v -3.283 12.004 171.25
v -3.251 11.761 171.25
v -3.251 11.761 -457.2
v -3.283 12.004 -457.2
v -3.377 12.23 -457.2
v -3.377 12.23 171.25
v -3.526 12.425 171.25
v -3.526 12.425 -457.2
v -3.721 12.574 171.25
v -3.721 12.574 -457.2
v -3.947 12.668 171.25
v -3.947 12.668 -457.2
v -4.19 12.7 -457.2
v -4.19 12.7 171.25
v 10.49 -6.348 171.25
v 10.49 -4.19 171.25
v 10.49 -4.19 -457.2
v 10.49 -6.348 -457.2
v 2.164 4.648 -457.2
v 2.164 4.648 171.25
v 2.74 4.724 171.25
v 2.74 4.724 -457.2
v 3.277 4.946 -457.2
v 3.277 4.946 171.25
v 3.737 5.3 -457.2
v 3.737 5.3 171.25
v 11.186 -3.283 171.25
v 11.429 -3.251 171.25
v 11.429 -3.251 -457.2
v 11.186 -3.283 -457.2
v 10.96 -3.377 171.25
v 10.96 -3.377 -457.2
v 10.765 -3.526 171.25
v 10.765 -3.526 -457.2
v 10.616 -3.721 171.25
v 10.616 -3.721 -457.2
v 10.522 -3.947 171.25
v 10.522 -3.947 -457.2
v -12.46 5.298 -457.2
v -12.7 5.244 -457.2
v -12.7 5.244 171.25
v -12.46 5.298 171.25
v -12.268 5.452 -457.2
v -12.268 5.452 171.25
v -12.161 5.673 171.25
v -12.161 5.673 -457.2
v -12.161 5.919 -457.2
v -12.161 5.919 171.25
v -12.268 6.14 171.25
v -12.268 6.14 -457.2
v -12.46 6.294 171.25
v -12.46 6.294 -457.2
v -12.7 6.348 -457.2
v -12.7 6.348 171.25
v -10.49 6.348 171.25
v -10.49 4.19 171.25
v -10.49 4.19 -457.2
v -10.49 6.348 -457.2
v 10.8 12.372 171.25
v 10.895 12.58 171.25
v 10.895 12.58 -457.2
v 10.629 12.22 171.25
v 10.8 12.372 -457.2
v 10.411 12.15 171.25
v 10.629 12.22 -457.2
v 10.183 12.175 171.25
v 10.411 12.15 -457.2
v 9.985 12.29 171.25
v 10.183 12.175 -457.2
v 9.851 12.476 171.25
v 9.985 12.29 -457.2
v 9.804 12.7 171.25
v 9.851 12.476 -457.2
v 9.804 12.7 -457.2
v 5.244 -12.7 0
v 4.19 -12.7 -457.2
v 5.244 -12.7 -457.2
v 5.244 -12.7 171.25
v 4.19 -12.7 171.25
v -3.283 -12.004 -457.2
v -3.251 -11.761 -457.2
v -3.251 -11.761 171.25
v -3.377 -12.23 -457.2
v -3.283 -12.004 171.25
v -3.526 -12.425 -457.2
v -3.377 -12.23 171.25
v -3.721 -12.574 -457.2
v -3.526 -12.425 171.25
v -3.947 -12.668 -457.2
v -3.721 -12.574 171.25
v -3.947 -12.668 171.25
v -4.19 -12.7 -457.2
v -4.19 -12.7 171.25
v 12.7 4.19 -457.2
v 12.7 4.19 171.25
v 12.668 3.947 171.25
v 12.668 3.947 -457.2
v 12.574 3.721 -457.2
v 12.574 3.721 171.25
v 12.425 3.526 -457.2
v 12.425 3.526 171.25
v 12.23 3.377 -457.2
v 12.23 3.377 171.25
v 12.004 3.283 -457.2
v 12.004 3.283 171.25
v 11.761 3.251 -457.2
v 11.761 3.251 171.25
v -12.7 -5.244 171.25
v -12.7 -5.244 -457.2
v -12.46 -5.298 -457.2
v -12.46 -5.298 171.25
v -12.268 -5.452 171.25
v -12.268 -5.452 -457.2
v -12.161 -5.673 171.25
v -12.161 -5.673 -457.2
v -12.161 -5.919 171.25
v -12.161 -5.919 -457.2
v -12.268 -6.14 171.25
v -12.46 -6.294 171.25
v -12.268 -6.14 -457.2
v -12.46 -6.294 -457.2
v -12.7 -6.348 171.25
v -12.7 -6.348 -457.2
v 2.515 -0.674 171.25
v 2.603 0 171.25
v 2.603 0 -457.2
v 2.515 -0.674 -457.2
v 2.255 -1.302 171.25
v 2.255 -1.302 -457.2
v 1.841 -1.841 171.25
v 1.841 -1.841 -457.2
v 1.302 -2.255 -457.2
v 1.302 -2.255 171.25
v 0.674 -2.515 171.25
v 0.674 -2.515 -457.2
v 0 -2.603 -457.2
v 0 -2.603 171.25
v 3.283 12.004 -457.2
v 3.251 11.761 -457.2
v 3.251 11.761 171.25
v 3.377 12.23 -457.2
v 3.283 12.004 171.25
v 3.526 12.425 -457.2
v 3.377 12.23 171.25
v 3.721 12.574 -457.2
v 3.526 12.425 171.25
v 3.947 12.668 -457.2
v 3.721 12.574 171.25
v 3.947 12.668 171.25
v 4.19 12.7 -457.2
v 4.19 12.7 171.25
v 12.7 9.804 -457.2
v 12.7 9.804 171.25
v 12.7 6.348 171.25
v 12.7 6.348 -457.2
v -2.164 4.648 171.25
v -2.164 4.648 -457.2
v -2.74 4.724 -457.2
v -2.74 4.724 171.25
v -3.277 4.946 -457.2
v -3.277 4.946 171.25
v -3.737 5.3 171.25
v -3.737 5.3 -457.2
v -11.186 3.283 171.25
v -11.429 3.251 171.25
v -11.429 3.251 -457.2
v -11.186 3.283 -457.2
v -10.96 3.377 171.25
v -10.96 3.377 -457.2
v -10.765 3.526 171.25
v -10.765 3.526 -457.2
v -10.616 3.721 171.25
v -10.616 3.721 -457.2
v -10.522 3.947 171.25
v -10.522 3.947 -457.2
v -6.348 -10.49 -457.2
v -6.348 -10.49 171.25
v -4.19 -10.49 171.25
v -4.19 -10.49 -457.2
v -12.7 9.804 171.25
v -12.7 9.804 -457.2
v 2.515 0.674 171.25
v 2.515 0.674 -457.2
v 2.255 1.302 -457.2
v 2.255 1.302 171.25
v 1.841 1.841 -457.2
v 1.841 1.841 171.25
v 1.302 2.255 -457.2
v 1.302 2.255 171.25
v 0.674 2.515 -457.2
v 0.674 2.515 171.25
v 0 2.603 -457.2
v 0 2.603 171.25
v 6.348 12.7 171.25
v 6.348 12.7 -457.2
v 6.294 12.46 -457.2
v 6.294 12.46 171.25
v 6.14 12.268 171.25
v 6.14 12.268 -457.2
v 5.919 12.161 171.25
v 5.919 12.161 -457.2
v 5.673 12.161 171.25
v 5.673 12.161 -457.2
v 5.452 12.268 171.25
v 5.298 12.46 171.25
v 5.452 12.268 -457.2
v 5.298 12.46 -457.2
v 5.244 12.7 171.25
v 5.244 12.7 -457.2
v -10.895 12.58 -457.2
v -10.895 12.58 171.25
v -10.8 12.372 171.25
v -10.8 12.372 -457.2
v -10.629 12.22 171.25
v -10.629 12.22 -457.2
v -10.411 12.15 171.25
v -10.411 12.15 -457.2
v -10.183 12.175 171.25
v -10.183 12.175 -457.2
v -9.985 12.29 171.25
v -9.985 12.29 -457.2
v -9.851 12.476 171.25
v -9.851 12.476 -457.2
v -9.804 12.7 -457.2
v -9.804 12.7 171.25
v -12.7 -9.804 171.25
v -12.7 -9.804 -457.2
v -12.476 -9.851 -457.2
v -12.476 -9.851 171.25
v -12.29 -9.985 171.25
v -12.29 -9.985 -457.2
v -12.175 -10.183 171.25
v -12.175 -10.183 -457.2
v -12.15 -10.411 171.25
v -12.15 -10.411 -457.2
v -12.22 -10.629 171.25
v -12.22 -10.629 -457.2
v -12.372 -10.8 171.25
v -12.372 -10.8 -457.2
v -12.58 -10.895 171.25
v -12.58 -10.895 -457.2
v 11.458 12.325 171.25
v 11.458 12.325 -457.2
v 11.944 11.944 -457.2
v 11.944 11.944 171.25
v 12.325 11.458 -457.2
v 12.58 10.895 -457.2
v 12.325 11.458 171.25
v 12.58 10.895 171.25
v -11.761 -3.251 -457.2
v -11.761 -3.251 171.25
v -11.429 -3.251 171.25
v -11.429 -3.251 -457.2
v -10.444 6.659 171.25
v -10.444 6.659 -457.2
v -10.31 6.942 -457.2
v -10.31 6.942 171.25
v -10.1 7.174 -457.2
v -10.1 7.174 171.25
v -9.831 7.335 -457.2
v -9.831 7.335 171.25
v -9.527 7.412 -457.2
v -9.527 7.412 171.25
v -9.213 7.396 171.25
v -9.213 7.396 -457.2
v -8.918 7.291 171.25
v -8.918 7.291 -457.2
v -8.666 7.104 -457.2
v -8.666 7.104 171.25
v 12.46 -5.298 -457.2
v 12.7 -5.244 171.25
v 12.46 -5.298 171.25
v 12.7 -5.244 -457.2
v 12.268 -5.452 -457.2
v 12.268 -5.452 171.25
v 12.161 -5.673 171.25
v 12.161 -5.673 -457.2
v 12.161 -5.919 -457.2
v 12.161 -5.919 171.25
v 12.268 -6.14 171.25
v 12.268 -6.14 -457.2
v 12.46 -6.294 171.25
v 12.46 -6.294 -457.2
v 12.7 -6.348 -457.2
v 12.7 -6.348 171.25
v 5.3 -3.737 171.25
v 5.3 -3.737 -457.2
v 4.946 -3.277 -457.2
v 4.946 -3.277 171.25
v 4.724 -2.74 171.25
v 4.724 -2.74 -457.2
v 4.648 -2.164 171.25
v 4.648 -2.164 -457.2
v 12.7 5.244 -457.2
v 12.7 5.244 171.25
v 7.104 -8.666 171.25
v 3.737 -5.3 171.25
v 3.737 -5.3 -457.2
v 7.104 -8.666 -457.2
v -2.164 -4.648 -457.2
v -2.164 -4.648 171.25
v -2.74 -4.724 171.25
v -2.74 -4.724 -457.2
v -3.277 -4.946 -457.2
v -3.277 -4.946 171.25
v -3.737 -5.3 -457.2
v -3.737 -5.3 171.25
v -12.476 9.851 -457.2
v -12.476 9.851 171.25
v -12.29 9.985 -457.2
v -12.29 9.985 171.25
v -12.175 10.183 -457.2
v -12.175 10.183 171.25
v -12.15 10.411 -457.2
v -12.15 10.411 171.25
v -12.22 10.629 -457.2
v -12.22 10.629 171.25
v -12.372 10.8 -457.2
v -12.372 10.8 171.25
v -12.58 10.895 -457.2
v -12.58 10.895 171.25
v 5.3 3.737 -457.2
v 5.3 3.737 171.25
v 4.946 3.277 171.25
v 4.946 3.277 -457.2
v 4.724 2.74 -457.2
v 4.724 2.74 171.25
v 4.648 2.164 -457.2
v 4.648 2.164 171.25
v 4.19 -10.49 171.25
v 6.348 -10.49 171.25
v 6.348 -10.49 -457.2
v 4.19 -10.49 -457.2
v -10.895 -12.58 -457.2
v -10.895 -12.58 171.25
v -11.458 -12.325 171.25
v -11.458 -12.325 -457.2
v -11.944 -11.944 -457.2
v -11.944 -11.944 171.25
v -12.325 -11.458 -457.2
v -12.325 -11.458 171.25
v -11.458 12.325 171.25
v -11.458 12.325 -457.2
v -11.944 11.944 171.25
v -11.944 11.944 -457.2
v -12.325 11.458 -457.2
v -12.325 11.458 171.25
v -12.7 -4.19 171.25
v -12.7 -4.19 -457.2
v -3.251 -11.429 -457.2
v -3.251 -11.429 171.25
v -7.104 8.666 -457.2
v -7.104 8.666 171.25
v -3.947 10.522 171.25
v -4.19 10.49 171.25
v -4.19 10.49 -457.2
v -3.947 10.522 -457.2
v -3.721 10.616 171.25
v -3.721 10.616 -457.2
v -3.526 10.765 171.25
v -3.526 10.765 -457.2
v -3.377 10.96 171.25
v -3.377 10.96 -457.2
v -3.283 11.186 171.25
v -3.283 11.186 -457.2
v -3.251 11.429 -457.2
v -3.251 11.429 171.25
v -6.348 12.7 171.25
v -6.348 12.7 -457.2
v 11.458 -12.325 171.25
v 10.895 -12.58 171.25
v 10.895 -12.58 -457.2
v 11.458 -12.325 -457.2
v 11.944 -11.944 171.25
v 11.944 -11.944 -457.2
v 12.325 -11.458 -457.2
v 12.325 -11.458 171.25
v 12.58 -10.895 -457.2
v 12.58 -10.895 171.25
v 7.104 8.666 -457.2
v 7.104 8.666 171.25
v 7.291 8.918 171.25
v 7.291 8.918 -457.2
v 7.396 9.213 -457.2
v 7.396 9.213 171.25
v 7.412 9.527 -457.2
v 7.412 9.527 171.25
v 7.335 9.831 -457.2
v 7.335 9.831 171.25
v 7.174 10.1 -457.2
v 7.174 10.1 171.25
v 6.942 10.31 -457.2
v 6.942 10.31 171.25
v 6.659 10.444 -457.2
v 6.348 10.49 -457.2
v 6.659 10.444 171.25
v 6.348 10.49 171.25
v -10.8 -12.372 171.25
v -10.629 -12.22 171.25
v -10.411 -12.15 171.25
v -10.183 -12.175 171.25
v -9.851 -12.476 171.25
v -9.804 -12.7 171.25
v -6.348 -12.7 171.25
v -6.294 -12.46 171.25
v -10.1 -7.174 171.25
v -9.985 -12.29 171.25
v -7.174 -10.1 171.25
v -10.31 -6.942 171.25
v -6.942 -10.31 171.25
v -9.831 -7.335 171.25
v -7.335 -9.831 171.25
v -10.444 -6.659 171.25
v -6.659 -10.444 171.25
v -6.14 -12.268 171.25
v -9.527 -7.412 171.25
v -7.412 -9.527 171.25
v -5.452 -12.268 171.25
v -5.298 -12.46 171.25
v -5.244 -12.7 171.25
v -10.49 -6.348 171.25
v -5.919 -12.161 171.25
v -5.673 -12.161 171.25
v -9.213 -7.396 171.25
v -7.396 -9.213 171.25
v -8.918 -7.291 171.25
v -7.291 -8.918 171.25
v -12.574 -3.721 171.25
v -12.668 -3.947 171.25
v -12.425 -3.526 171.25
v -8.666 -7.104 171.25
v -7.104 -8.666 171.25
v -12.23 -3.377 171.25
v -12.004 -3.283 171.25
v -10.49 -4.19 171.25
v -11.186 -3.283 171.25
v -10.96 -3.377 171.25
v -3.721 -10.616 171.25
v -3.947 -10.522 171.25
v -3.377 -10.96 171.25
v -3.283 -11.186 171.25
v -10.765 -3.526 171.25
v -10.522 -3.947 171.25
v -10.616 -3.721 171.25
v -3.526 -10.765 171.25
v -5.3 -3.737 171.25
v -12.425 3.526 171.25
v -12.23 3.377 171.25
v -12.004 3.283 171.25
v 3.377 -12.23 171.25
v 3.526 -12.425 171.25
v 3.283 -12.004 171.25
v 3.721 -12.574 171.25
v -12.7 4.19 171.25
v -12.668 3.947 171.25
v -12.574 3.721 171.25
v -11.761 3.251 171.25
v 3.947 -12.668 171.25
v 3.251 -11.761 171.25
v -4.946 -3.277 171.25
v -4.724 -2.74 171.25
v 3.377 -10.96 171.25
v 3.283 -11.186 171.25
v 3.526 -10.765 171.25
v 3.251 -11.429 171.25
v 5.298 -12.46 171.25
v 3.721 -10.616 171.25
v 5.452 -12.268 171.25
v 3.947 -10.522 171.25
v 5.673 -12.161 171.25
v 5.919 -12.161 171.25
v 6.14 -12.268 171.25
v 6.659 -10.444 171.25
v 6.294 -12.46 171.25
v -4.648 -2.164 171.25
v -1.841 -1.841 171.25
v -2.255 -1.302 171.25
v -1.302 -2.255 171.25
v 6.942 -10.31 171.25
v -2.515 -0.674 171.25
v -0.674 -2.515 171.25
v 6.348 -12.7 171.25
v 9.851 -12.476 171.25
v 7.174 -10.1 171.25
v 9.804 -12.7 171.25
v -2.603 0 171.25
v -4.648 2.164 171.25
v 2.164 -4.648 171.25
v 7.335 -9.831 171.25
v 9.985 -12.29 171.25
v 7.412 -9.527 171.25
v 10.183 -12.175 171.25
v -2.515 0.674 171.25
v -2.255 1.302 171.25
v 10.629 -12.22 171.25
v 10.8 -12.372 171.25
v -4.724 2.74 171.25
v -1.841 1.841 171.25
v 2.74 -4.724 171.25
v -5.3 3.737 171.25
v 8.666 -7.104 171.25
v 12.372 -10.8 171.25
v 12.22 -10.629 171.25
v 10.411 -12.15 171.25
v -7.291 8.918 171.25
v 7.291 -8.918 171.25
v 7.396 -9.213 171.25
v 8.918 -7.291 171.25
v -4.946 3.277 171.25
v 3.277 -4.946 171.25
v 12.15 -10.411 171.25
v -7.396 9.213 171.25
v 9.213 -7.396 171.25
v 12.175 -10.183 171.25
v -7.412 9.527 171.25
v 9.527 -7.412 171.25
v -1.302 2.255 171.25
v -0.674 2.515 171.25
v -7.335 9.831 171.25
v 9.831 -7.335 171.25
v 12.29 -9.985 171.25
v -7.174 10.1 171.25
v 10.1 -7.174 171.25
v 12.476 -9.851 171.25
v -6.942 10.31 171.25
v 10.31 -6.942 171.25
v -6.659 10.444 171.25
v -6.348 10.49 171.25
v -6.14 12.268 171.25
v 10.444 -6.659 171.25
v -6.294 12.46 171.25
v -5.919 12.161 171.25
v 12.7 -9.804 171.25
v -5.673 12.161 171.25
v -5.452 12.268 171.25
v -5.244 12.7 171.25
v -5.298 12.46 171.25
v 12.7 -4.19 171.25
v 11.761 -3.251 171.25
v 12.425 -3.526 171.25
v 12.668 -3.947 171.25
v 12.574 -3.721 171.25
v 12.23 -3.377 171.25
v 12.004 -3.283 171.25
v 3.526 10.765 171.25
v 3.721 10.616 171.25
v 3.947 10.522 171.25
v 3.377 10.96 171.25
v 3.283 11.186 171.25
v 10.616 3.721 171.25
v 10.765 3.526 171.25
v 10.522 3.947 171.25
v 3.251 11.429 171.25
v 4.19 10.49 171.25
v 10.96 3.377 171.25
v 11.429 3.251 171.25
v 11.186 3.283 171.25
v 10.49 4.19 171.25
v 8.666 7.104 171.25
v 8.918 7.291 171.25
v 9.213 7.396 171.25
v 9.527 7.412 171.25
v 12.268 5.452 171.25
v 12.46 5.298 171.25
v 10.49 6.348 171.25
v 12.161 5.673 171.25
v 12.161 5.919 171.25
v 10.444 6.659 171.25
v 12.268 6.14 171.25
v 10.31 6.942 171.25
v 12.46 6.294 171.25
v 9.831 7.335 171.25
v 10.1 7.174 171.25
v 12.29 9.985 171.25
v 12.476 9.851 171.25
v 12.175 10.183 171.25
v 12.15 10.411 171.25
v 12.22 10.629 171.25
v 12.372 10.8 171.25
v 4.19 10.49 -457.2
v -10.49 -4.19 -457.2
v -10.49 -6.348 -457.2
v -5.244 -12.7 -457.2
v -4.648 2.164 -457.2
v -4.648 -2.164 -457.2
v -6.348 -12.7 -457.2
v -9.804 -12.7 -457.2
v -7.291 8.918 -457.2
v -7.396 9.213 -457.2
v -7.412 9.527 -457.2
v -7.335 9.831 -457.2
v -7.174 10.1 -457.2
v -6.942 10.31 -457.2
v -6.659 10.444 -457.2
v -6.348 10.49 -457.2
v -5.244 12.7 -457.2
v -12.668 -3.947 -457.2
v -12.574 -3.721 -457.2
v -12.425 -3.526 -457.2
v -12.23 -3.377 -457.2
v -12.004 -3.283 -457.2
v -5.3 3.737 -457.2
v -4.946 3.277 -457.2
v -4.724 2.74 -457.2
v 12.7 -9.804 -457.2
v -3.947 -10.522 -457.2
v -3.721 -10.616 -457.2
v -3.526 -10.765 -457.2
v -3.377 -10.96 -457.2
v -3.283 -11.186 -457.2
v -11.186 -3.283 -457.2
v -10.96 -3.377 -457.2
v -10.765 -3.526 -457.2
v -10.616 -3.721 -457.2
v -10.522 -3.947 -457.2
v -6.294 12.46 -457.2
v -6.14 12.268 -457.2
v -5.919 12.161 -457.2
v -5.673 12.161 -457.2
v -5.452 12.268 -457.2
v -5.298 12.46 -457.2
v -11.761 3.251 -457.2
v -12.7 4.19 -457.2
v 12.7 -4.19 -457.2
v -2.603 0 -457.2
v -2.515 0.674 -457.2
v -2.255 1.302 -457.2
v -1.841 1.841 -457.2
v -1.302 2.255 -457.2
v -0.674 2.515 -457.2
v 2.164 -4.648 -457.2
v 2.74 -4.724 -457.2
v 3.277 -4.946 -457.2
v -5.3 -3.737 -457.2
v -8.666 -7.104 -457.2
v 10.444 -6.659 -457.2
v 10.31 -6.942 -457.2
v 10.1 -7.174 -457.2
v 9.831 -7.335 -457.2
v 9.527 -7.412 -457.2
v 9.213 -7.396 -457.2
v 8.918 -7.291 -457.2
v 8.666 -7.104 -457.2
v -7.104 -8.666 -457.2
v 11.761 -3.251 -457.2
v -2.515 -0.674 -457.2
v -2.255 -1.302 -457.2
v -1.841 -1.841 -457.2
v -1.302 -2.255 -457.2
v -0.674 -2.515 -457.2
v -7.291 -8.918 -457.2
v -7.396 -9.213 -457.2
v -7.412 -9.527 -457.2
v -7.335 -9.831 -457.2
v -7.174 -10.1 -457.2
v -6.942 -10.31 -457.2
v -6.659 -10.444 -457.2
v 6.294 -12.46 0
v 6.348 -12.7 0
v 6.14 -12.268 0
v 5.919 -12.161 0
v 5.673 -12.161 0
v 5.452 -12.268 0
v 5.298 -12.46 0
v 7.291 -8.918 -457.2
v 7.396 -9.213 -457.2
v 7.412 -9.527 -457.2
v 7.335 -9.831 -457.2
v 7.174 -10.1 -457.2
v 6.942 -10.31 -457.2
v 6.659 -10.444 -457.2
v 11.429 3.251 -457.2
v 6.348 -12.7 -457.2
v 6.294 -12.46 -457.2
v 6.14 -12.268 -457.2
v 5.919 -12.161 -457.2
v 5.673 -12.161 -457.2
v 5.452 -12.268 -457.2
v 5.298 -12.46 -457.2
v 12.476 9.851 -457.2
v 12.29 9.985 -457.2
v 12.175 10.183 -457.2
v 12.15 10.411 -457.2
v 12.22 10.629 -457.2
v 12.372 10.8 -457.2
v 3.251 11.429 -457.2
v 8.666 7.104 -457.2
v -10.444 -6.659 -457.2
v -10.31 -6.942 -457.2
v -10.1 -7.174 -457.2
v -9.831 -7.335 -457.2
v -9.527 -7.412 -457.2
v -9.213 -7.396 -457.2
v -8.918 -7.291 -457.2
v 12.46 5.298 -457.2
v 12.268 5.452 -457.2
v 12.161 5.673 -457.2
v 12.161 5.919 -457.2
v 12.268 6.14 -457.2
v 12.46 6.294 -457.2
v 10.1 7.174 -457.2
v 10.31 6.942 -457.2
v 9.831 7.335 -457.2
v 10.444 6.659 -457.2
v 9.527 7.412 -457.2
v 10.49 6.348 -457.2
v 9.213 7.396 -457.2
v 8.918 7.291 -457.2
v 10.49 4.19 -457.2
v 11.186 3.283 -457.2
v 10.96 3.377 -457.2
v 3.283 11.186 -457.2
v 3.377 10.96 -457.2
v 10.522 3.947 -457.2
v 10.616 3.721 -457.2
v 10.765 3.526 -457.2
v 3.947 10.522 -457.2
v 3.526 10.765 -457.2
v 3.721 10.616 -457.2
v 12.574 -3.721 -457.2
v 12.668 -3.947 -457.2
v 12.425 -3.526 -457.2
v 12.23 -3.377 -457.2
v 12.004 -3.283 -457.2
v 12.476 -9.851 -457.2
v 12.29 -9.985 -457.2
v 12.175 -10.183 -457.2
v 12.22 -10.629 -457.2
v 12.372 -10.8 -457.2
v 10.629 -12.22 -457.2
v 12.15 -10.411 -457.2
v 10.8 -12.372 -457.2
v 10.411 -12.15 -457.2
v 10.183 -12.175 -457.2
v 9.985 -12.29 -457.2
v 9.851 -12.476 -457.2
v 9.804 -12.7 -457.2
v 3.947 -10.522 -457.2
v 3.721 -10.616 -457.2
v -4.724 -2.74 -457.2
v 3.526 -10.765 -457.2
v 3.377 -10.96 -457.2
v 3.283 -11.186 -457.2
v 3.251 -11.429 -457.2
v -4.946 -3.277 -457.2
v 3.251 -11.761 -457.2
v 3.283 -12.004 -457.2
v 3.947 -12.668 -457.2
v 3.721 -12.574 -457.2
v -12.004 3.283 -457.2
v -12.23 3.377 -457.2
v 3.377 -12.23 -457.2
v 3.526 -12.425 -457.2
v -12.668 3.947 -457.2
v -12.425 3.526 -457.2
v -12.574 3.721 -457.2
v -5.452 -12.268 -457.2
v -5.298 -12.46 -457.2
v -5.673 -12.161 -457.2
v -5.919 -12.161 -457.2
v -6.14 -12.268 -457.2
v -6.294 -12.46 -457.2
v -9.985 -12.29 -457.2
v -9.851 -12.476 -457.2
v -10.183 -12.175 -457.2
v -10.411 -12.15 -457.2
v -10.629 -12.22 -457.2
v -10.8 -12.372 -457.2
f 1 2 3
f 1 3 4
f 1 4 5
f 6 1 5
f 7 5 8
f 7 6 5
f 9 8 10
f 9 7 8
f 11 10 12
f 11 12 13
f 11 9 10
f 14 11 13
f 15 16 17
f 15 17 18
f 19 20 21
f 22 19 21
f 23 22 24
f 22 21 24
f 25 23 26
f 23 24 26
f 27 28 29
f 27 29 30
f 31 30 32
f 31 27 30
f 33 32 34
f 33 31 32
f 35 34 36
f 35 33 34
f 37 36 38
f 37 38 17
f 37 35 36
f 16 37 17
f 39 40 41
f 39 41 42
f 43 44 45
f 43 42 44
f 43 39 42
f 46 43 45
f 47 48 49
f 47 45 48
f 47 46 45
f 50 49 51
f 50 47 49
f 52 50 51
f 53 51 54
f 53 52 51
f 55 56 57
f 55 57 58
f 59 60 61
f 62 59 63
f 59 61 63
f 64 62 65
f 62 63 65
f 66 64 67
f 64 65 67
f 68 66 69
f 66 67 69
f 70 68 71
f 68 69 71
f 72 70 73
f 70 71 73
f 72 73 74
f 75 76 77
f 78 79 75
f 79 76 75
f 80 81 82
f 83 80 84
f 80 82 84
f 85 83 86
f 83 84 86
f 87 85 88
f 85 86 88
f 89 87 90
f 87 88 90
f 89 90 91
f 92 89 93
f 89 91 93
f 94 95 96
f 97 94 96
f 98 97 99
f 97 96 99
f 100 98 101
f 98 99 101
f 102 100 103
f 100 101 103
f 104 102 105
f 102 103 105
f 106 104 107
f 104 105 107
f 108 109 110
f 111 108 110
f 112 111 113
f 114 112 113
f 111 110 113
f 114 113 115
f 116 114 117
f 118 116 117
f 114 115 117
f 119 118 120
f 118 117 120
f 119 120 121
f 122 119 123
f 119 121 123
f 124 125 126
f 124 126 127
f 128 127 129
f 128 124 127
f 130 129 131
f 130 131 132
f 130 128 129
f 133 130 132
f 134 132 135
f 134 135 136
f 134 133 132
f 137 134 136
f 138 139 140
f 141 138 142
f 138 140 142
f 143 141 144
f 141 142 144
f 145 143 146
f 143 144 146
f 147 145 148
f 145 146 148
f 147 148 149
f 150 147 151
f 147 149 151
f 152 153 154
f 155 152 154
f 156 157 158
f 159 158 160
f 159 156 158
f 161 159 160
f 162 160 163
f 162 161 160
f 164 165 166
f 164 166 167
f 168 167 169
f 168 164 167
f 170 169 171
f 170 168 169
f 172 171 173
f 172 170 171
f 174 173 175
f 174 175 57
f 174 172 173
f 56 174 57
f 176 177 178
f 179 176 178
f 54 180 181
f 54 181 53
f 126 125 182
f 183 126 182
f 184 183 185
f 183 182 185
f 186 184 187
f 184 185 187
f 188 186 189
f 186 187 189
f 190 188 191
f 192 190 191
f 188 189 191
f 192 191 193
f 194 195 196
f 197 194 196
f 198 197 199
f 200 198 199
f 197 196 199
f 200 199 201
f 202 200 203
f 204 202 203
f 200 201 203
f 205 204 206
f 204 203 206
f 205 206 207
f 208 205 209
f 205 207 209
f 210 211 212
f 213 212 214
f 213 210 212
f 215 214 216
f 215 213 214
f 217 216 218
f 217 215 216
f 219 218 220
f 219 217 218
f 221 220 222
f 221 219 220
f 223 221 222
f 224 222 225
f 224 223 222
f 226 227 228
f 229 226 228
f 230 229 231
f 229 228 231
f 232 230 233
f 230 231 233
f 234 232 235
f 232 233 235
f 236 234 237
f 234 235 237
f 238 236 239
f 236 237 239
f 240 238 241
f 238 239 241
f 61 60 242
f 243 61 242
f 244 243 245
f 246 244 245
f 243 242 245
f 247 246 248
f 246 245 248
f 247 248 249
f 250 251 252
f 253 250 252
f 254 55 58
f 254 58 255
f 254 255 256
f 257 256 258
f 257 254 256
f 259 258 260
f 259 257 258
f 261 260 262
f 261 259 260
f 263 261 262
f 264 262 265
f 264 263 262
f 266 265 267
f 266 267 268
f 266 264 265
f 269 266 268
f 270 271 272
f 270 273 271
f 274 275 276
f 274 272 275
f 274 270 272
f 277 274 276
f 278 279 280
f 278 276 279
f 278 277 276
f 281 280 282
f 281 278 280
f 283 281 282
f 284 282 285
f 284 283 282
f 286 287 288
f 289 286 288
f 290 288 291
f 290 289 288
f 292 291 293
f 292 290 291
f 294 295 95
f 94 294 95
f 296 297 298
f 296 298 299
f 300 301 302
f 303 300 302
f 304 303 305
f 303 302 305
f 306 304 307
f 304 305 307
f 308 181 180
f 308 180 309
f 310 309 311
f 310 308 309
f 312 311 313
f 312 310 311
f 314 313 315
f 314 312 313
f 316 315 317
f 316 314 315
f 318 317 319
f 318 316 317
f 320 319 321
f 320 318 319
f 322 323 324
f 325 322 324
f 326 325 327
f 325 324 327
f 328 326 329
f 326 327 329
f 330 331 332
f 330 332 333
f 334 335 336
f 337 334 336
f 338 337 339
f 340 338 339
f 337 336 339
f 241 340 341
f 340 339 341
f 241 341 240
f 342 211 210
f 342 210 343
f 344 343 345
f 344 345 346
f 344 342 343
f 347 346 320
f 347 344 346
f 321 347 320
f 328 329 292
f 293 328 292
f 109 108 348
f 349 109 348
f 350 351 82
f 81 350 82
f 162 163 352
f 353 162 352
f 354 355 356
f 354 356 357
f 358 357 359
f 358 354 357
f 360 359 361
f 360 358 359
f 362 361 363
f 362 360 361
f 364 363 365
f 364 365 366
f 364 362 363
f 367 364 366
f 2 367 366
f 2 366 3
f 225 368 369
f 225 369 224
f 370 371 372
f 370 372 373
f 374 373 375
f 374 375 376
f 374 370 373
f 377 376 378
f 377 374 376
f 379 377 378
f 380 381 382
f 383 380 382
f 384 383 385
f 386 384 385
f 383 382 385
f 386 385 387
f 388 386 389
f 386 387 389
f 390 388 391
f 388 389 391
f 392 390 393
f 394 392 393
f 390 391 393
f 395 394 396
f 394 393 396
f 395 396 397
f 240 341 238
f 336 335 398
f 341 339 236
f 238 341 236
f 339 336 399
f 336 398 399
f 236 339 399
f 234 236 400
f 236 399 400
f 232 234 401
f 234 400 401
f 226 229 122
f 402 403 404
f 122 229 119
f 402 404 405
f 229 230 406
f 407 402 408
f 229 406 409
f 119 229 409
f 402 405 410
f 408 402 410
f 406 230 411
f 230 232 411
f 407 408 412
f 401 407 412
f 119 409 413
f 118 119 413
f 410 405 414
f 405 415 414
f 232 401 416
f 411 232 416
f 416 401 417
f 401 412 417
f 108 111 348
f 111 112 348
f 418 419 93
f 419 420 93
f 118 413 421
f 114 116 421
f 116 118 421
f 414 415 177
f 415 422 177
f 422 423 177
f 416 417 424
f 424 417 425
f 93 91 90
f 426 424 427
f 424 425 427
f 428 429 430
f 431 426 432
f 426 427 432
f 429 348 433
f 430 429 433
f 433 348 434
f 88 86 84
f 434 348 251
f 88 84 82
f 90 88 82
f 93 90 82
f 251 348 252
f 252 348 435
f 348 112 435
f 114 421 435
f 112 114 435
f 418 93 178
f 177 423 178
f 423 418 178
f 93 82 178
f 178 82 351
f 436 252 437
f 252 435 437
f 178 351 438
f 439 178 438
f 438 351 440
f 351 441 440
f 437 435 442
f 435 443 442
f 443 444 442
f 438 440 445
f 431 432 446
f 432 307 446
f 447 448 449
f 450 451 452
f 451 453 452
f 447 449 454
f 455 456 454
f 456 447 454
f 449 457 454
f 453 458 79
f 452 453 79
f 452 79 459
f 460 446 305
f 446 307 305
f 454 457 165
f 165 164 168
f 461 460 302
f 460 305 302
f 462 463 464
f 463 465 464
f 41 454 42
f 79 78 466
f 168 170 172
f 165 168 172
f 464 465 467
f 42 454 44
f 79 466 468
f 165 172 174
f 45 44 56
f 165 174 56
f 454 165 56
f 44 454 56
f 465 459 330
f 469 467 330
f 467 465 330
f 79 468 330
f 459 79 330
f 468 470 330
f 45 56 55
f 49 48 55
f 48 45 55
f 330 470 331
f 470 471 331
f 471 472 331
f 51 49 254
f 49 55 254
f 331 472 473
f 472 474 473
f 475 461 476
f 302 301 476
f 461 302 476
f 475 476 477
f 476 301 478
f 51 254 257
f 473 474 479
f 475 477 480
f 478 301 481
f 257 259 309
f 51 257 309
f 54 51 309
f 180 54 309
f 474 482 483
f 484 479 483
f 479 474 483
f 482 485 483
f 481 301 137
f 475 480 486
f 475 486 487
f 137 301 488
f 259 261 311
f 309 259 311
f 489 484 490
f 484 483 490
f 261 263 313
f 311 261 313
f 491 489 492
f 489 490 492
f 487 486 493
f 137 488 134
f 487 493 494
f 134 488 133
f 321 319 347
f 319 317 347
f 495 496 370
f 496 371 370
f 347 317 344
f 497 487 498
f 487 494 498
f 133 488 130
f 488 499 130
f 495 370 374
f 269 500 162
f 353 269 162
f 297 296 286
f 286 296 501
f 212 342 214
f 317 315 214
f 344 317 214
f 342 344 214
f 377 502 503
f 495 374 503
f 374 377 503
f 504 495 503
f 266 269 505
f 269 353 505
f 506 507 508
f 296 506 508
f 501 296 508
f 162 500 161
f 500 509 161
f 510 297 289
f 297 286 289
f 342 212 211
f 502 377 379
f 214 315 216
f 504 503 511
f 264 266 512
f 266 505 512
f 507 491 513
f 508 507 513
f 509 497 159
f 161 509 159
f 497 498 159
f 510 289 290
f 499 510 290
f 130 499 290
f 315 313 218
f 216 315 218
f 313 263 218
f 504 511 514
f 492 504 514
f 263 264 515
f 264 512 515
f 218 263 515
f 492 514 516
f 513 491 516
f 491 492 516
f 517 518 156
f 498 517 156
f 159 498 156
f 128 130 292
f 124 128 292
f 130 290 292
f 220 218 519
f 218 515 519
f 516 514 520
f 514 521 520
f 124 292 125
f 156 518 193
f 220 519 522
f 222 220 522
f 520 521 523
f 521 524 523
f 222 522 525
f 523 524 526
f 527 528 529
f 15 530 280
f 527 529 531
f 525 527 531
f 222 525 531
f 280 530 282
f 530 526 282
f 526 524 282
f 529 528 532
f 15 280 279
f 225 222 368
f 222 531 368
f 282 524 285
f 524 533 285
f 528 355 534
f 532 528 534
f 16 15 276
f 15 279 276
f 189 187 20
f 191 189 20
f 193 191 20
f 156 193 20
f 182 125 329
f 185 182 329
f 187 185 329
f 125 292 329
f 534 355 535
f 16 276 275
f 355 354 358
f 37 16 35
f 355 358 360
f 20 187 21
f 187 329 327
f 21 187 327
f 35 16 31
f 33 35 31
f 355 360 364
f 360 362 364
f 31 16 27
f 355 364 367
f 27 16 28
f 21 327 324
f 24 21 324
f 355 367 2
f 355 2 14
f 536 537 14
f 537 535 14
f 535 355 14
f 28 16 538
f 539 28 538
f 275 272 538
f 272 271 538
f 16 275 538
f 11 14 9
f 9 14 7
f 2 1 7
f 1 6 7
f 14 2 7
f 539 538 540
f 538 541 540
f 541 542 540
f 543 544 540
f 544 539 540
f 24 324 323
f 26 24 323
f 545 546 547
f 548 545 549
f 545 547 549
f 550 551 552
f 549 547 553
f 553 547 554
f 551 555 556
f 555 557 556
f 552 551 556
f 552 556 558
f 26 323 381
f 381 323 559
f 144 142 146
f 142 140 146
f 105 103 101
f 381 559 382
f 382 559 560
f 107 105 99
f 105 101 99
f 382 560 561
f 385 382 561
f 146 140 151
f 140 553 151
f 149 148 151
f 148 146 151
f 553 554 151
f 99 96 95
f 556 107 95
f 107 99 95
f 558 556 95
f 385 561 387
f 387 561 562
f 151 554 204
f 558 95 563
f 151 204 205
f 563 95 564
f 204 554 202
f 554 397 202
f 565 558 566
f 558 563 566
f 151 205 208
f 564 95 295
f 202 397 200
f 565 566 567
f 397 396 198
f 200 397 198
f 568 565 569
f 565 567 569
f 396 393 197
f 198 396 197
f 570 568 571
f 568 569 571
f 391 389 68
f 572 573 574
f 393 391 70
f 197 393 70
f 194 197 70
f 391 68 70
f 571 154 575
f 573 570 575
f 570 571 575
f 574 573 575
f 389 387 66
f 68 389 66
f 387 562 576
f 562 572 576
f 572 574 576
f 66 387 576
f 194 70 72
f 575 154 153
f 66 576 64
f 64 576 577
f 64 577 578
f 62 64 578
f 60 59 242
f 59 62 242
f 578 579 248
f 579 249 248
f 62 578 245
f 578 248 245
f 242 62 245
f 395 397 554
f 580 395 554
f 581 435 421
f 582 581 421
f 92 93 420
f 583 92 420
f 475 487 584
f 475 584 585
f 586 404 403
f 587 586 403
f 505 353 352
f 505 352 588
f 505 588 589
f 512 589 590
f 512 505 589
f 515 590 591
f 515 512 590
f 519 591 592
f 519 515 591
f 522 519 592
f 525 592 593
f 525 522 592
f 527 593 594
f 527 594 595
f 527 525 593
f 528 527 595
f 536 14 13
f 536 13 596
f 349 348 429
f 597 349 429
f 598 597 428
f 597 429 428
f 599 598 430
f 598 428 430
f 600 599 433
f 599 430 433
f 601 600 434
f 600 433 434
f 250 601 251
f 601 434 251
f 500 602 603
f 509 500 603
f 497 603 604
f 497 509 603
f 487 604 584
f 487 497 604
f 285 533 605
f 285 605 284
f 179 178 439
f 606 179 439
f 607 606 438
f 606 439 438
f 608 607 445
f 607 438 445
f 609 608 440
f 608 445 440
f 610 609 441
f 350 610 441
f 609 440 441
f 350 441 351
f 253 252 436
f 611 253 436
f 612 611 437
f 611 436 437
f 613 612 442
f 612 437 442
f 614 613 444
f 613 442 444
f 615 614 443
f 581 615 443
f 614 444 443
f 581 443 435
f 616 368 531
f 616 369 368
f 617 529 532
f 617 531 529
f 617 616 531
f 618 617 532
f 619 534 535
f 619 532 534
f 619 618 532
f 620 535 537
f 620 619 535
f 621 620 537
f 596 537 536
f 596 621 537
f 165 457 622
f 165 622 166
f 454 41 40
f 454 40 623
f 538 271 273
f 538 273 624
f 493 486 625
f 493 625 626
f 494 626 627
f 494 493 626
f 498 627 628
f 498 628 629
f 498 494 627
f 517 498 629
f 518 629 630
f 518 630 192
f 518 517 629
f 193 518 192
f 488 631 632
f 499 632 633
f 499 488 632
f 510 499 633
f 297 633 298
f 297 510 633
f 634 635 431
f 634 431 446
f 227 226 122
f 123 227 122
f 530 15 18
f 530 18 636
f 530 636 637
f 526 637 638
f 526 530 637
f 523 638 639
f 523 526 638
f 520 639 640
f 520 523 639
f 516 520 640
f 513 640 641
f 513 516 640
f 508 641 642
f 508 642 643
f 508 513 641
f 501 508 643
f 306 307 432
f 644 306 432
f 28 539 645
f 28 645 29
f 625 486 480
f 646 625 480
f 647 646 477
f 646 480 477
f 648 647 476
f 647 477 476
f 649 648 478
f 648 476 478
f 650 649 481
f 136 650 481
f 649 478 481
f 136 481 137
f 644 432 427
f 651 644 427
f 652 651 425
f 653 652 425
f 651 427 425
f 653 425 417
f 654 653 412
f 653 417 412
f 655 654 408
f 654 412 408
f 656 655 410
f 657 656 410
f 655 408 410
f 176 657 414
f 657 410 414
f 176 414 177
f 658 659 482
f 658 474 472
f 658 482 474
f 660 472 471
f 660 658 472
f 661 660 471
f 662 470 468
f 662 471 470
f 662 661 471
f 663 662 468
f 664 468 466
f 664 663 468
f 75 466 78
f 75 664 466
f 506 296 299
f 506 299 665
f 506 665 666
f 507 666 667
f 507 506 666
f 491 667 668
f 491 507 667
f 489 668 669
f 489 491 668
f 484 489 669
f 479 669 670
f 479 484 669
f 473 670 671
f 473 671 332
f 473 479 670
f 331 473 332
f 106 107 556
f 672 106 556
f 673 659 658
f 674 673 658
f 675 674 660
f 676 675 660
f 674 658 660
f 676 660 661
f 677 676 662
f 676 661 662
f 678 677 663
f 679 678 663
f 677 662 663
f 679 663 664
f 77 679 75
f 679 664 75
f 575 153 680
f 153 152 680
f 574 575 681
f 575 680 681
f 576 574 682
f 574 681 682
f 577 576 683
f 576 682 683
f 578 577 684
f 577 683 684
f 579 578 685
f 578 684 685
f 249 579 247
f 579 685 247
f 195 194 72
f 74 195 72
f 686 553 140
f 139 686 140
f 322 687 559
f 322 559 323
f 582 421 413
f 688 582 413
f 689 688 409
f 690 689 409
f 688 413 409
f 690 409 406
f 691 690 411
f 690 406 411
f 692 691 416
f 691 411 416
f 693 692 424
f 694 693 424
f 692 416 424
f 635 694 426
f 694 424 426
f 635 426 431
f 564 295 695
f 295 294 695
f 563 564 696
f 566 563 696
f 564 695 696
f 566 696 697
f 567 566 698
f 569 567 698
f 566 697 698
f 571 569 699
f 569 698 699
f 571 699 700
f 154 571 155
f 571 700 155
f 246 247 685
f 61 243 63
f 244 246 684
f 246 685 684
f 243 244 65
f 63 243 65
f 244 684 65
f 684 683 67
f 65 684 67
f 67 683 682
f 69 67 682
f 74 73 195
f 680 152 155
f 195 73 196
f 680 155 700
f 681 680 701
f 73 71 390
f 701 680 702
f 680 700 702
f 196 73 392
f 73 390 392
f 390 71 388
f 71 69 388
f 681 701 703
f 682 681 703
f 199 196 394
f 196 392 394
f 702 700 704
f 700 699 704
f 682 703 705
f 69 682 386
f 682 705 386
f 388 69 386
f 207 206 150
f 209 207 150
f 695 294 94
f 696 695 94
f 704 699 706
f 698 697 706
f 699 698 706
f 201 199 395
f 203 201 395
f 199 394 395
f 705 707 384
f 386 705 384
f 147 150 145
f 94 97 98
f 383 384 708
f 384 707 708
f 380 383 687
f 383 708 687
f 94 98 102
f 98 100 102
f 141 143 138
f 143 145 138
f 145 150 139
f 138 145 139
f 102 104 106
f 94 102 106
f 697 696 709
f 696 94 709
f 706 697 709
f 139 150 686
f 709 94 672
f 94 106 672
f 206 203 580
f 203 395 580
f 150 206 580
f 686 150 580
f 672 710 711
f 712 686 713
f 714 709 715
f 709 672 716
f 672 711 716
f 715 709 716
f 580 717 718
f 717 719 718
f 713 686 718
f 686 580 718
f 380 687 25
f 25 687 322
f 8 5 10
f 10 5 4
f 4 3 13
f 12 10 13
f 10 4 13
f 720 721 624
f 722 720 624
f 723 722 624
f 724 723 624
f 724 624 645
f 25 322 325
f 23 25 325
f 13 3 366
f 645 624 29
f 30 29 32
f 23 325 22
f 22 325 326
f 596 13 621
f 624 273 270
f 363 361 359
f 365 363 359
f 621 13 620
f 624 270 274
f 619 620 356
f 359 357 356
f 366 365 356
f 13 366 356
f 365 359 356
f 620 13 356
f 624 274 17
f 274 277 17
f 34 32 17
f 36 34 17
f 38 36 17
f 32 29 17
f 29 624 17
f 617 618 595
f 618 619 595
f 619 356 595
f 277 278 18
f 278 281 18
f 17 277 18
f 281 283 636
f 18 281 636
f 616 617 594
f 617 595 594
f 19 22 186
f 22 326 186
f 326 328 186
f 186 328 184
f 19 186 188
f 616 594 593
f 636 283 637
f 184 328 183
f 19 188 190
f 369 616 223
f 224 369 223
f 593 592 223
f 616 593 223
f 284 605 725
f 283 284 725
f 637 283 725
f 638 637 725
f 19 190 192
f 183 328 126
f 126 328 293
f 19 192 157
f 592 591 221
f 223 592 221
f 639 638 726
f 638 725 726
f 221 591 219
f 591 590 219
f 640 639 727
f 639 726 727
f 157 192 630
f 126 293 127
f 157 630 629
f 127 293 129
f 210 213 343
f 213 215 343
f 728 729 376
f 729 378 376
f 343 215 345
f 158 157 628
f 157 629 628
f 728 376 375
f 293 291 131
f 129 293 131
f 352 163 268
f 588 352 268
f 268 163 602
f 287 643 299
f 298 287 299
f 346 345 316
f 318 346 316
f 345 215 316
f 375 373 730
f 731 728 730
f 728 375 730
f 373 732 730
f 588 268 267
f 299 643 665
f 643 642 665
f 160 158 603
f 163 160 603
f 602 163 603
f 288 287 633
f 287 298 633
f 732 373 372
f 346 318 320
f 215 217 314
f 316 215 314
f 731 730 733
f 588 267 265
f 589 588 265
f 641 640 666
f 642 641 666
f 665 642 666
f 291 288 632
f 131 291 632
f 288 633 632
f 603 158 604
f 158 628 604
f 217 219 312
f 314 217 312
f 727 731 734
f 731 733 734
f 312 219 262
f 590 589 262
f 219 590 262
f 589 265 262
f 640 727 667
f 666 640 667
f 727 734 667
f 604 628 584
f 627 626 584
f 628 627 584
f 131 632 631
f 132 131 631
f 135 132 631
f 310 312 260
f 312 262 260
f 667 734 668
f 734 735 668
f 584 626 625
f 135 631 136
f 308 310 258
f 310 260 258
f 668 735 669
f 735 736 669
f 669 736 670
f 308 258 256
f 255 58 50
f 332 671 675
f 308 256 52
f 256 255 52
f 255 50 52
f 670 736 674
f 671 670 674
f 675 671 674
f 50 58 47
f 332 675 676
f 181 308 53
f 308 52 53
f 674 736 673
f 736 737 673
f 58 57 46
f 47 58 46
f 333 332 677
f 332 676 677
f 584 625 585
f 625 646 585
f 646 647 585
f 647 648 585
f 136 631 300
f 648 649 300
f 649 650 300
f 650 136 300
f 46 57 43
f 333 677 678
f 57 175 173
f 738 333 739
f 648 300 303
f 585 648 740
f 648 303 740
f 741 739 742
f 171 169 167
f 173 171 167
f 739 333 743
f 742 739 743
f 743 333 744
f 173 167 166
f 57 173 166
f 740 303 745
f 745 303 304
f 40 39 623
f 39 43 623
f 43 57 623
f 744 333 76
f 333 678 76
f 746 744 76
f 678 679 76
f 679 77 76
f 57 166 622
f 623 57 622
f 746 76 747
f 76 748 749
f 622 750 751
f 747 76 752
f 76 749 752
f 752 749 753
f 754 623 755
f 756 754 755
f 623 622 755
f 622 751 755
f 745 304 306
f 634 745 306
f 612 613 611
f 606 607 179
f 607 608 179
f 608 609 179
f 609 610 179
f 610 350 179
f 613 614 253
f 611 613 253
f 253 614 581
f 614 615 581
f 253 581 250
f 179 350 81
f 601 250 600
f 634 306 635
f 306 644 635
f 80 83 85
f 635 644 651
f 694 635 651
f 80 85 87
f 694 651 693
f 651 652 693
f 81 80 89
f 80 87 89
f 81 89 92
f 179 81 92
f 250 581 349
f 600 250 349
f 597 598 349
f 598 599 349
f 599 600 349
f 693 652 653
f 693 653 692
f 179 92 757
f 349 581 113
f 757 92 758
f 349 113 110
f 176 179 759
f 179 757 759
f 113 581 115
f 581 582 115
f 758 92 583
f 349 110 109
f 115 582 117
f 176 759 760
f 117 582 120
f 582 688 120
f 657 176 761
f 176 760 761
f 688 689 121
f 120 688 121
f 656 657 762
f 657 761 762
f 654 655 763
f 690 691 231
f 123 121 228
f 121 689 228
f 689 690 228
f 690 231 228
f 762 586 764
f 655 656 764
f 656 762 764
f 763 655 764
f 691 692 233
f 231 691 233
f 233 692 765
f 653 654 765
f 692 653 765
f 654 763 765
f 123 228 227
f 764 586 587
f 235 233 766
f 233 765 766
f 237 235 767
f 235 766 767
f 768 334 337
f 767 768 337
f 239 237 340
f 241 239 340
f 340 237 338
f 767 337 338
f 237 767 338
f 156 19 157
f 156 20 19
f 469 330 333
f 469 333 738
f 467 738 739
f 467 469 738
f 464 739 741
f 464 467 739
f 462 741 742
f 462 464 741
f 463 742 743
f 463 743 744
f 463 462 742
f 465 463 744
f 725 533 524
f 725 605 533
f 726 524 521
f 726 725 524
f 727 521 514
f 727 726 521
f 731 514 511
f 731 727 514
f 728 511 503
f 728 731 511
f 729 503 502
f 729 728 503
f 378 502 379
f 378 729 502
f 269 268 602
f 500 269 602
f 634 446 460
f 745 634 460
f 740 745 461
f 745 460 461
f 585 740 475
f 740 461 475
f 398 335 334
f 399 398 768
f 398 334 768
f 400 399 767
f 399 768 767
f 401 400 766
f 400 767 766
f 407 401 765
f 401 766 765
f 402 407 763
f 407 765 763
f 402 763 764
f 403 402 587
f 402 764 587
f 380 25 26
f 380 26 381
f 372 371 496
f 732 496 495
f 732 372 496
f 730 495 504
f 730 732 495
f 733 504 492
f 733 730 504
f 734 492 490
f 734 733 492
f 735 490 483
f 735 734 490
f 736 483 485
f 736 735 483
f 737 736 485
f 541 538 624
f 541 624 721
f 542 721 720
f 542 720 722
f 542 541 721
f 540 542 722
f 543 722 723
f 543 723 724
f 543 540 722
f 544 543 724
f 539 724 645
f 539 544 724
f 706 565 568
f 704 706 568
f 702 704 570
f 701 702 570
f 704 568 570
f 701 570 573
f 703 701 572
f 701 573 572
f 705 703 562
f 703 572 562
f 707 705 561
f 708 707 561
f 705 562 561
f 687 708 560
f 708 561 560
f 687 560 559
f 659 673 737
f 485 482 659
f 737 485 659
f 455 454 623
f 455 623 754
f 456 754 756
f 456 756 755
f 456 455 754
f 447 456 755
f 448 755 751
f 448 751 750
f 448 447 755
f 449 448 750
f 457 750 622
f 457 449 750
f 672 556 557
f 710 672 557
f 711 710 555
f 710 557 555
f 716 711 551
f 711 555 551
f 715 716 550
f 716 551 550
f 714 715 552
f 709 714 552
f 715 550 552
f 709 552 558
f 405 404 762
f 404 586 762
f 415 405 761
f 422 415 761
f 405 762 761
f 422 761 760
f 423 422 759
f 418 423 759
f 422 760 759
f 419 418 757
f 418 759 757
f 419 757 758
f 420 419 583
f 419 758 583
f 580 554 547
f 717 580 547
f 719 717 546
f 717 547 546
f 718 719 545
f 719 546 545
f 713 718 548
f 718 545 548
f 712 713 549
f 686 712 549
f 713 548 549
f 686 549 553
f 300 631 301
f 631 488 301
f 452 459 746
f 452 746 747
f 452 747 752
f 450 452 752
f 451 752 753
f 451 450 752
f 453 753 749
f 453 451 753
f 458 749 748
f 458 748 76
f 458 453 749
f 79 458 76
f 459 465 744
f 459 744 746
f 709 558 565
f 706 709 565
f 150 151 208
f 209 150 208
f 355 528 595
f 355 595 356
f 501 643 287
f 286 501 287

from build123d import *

# Parameters (mm, degrees)
BOSS_EXTRUDE1_DEPTH     = 457.2
SKETCH5_R               = 0.55245
CUT_EXTRUDE1_DEPTH      = 458.2
CUT_EXTRUDE1_DEPTH_BACK = 458.2
SKETCH6_W               = 452.610989416
SKETCH6_H               = 156.175660084
CUT_EXTRUDE2_DEPTH      = 13.97


with BuildPart() as part:
    # Sketch4 → Boss-Extrude1 (new body, symmetric)
    with BuildSketch(Plane.XY):
        with BuildLine():
            Line((4.190365, -12.7), (10.11729625, -12.7))
            ThreePointArc((10.11729625, -12.7), (11.943543585, -11.943543585), (12.7, -10.11729625))
            Line((12.7, -10.11729625), (12.7, -4.190365))
            ThreePointArc((12.7, -4.190365), (12.42492494, -3.52627506), (11.760835, -3.2512))
            Line((11.760835, -3.2512), (11.429365, -3.2512))
            ThreePointArc((11.429365, -3.2512), (10.76527506, -3.52627506), (10.4902, -4.190365))
            Line((10.4902, -4.190365), (10.4902, -6.348478019))
            ThreePointArc((10.4902, -6.348478019), (9.830707141, -7.335478831), (8.666460301, -7.103895736))
            Line((8.666460301, -7.103895736), (5.299899128, -3.737334563))
            ThreePointArc((5.299899128, -3.737334563), (4.817571085, -3.015479634), (4.6482, -2.16399369))
            Line((4.6482, -2.16399369), (4.6482, 0))
            Line((4.6482, 0), (2.6035, 0))
            ThreePointArc((2.6035, 0), (1.840952505, -1.840952505), (0, -2.6035))
            Line((0, -2.6035), (0, -4.6482))
            Line((0, -4.6482), (2.16399369, -4.6482))
            ThreePointArc((2.16399369, -4.6482), (3.015479634, -4.817571085), (3.737334563, -5.299899128))
            Line((3.737334563, -5.299899128), (7.103895736, -8.666460301))
            ThreePointArc((7.103895736, -8.666460301), (7.335478831, -9.830707141), (6.348478019, -10.4902))
            Line((6.348478019, -10.4902), (4.190365, -10.4902))
            ThreePointArc((4.190365, -10.4902), (3.52627506, -10.76527506), (3.2512, -11.429365))
            Line((3.2512, -11.429365), (3.2512, -11.760835))
            ThreePointArc((3.2512, -11.760835), (3.52627506, -12.42492494), (4.190365, -12.7))
        make_face()
    extrude(amount=BOSS_EXTRUDE1_DEPTH, both=True)

    # Sketch5 → Cut-Extrude1 (cut, two sides)
    with BuildSketch(Plane.XY) as cut_extrude1_sk:
        with Locations((10.356153152, -12.7)):
            Circle(SKETCH5_R)
        with Locations((5.796028019, -12.7)):
            Circle(SKETCH5_R)
        with Locations((12.7, -10.356153152)):
            Circle(SKETCH5_R)
        with Locations((12.7, -5.796028019)):
            Circle(SKETCH5_R)
    extrude(amount=CUT_EXTRUDE1_DEPTH, mode=Mode.SUBTRACT)
    extrude(cut_extrude1_sk.sketch, amount=-CUT_EXTRUDE1_DEPTH_BACK, mode=Mode.SUBTRACT)

    # Mirror1: part across plane


with BuildPart() as part_1:
    add(part.part)
    add(part.part.mirror(Plane(origin=(0, 0, 0), x_dir=(0, 0, 1), z_dir=(1, 0, 0))))

    # Mirror2: part across plane


with BuildPart() as part_2:
    add(part_1.part)
    add(part_1.part.mirror(Plane.ZX))

    # Sketch6 → Cut-Extrude2 (cut, symmetric)
    with BuildSketch(Plane(origin=(0, 0, 0), x_dir=(0, 0, -1), z_dir=(1, 0, 0))):
        with Locations((-397.555494708, -8.455370132)):
            Rectangle(SKETCH6_W, SKETCH6_H)
    extrude(amount=CUT_EXTRUDE2_DEPTH, both=True, mode=Mode.SUBTRACT)


solid = part_2.part
